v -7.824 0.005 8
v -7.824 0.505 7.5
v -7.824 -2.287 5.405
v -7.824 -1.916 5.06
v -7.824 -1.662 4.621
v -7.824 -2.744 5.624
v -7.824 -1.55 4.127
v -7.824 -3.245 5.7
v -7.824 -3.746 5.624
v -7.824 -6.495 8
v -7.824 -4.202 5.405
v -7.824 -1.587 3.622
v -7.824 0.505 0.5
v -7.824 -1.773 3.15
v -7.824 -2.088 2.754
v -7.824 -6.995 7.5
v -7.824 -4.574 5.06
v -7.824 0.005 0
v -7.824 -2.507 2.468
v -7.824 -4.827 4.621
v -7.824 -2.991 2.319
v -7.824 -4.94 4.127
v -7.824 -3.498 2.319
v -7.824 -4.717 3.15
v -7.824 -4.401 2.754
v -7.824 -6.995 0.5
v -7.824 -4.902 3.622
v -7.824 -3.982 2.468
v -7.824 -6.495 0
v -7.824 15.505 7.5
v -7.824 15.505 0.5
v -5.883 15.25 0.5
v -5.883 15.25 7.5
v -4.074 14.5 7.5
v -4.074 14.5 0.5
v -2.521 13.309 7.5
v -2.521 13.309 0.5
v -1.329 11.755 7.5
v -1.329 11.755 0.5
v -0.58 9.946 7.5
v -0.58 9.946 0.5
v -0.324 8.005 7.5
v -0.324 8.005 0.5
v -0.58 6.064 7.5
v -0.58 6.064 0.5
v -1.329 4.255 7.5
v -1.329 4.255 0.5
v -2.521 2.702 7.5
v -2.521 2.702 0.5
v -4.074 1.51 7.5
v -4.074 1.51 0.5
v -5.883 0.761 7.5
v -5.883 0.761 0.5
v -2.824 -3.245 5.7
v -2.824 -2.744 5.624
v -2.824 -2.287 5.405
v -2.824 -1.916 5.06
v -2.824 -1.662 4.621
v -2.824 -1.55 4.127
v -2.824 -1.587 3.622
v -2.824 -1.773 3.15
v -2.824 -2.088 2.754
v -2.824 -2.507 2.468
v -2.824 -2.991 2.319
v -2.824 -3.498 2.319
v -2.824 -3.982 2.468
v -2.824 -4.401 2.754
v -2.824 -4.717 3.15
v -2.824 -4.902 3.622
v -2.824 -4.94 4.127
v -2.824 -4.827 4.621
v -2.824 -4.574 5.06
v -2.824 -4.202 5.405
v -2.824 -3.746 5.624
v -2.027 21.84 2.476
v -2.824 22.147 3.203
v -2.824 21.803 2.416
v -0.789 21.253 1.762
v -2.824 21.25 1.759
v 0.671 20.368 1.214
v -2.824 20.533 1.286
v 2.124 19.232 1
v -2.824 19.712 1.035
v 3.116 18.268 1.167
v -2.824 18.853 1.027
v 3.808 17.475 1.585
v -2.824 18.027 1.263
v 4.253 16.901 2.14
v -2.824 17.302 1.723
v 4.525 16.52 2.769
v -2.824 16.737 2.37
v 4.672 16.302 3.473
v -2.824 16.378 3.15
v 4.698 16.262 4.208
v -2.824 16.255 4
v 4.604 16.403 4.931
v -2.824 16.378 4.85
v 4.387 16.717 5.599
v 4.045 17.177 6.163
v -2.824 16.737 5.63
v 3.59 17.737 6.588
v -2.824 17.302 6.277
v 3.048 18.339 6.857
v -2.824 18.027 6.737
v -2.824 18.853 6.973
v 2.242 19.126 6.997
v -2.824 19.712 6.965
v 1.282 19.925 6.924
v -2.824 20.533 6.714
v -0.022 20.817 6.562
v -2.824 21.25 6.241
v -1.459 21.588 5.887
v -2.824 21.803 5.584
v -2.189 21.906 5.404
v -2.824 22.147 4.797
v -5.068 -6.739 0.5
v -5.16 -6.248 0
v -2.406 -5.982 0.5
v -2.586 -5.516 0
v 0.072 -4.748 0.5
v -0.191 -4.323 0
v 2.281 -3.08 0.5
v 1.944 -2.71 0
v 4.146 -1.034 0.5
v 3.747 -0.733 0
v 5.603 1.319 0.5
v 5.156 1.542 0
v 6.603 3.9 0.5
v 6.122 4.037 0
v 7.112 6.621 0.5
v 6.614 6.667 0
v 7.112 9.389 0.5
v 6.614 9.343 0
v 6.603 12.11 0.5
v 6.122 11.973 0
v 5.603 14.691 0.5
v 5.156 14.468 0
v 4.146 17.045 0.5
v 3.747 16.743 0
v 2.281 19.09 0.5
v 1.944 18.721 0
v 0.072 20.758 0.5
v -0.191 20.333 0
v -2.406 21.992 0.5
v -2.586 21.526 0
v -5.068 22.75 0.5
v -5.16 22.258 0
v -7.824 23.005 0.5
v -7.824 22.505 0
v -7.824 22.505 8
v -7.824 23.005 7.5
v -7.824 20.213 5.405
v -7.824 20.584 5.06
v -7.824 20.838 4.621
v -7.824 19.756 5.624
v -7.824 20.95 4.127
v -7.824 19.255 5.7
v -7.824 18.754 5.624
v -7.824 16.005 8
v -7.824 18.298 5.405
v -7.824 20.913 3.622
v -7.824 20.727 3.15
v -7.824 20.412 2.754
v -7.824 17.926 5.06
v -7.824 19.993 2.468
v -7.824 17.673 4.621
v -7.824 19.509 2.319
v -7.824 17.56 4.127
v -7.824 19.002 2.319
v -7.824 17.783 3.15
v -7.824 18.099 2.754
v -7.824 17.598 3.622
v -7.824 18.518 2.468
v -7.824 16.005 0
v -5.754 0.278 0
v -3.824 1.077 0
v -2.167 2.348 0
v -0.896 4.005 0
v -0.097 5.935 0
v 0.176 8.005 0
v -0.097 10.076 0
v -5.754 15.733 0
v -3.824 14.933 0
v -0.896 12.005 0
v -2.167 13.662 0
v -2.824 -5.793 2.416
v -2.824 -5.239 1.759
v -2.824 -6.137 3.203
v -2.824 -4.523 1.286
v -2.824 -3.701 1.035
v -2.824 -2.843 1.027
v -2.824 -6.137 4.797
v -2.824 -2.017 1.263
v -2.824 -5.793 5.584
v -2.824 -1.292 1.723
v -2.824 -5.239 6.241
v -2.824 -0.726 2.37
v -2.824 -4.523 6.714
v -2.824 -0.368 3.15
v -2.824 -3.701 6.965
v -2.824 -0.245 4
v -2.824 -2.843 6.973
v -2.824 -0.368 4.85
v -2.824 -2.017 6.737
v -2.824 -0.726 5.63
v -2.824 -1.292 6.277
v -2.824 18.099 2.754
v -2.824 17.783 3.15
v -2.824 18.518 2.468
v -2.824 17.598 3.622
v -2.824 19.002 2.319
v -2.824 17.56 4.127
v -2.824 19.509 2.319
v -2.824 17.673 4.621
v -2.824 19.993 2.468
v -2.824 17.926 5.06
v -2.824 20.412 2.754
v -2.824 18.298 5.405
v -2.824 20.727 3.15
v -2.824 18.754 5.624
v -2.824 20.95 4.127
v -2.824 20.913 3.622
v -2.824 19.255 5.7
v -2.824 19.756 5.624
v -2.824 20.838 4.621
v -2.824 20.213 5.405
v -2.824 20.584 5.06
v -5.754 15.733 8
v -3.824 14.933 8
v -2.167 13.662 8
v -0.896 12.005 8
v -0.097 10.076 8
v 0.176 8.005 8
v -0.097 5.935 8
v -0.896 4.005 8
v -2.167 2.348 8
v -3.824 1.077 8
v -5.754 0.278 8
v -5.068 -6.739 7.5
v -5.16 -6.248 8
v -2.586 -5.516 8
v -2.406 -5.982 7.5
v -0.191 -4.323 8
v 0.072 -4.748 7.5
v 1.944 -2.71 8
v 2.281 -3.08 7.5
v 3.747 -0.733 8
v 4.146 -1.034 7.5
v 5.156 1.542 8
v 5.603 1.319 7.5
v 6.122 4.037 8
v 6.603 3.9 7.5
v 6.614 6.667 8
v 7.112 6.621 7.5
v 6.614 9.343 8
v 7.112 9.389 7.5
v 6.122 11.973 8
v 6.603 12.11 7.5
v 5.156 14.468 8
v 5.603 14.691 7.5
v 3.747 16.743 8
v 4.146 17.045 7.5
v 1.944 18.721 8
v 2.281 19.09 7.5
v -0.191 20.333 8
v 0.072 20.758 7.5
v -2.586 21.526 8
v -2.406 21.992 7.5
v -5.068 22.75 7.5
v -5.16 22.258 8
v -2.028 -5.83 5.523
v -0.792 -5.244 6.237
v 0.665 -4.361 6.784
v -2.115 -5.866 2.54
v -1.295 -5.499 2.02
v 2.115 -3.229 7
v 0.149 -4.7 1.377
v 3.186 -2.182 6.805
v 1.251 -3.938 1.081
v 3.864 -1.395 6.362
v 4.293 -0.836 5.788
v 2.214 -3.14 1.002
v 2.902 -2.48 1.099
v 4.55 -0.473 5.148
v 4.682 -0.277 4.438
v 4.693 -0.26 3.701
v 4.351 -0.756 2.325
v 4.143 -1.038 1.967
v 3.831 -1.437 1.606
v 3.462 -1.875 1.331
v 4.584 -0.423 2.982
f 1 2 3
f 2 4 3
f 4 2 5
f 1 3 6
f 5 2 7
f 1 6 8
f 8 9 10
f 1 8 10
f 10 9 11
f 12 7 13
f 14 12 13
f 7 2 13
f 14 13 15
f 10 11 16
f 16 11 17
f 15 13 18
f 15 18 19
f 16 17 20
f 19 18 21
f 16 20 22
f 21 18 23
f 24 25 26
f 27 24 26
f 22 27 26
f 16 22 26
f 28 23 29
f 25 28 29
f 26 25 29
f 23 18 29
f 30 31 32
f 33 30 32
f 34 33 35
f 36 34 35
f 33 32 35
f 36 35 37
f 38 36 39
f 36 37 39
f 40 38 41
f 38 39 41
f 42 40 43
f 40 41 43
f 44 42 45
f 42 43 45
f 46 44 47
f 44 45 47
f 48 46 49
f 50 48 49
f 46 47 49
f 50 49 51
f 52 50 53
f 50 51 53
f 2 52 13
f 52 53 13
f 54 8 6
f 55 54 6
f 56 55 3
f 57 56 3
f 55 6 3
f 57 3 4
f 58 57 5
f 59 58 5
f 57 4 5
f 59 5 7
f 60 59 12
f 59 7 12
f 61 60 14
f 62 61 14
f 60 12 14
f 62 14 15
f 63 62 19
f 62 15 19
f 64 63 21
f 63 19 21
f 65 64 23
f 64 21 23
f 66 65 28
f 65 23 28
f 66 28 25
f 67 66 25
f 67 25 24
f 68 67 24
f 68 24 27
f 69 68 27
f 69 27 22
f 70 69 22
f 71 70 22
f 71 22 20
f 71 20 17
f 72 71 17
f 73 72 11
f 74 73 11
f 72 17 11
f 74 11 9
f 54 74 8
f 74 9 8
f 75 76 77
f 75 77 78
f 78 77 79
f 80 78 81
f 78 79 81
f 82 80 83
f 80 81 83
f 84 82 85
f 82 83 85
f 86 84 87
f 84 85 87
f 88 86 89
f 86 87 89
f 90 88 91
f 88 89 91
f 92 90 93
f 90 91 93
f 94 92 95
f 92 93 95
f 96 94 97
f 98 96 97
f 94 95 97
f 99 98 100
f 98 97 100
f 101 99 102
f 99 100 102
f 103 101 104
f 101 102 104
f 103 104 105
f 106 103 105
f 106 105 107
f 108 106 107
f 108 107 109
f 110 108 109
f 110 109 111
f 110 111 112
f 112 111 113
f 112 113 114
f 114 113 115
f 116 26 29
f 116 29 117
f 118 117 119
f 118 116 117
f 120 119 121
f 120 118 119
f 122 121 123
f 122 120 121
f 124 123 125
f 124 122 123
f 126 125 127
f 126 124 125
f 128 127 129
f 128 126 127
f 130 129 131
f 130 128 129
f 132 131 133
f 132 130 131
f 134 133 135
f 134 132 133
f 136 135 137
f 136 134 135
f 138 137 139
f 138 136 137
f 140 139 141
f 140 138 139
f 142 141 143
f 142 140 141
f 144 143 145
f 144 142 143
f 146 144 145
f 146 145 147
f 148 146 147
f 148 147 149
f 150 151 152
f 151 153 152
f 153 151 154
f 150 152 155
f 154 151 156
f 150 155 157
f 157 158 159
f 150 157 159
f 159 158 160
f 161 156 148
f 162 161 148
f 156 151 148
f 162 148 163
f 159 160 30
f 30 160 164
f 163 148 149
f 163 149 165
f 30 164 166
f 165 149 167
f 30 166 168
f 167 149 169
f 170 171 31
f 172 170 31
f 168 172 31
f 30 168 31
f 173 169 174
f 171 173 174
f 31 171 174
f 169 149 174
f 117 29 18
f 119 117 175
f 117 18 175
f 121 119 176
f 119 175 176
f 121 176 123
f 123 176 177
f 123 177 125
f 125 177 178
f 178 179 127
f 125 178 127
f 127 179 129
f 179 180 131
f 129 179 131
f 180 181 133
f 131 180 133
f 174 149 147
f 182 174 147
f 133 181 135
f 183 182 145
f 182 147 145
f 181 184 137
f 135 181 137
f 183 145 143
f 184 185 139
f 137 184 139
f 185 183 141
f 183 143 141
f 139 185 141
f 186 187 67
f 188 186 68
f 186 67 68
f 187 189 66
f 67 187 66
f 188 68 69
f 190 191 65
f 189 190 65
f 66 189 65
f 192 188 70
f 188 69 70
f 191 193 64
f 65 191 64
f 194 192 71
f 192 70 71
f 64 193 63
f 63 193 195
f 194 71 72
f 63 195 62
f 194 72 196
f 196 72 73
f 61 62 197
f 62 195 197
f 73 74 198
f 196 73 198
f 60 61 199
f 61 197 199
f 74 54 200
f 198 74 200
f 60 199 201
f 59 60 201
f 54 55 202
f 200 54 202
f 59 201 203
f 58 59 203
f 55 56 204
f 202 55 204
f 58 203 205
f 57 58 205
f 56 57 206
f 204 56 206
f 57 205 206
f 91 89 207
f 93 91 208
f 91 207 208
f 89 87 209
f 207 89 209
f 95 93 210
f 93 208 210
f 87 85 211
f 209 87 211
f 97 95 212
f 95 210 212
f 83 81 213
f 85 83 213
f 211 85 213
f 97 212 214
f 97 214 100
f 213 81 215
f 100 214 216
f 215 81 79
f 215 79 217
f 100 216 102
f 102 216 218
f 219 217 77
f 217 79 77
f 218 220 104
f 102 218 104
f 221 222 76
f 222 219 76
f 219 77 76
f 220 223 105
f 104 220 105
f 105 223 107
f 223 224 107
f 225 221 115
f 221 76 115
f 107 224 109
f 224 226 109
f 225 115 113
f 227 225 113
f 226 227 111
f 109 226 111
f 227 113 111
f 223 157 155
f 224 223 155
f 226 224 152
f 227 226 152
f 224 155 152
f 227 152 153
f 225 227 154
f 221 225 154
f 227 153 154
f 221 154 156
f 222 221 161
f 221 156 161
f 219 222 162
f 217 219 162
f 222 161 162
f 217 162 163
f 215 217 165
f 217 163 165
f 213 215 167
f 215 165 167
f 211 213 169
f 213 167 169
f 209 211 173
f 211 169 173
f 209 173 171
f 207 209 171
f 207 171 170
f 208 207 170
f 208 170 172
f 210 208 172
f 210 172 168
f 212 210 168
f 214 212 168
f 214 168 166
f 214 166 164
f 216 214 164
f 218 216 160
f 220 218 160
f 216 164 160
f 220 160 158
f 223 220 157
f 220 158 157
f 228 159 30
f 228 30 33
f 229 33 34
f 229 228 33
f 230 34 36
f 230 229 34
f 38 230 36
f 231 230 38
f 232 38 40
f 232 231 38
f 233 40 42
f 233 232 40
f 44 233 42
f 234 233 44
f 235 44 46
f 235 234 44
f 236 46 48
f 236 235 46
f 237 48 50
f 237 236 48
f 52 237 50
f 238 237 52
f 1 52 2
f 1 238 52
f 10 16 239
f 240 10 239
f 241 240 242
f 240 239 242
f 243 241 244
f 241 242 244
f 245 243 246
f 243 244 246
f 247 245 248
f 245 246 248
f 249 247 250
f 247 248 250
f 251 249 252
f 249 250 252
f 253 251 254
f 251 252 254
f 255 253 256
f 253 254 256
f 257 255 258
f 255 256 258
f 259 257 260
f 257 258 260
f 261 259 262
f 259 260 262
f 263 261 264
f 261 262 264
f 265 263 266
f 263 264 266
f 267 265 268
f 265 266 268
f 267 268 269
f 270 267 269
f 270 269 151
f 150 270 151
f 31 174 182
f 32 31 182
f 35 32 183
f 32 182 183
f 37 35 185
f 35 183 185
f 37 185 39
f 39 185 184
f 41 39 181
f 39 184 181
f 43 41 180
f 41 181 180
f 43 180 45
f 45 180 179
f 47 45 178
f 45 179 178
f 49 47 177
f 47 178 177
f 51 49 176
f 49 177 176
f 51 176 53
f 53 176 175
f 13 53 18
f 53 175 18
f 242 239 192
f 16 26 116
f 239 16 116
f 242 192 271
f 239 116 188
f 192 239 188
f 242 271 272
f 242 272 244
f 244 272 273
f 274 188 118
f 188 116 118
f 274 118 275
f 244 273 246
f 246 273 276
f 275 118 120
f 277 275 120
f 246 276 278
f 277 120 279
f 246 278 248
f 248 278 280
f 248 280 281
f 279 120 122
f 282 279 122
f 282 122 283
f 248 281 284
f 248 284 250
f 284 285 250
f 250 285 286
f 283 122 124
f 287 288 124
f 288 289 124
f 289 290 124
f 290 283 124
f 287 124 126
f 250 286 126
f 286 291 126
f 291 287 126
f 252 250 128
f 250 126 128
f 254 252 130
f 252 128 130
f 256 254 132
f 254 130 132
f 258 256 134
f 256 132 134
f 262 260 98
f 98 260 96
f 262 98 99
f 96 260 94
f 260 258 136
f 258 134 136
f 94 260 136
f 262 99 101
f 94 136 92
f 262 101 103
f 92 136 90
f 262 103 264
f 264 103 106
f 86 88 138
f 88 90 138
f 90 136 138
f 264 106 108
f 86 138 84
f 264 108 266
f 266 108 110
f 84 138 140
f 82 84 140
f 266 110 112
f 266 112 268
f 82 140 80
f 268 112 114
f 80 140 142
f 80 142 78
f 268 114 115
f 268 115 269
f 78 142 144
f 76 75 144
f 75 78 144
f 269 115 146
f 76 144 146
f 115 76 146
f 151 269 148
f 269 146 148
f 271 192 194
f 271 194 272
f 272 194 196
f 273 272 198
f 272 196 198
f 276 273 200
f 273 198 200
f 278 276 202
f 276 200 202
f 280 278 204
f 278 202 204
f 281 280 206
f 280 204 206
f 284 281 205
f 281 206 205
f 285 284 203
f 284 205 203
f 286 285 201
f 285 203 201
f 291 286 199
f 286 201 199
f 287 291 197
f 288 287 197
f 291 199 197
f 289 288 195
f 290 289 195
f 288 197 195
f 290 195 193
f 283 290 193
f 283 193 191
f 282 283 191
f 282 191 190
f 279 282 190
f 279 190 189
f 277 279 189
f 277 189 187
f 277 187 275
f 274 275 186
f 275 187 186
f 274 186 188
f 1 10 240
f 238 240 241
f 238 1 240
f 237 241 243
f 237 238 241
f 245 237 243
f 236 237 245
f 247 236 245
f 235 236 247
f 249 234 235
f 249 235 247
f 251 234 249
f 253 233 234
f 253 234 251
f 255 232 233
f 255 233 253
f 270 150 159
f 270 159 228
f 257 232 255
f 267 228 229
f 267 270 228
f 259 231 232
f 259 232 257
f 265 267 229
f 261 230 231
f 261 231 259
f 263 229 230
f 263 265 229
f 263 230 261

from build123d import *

# Parameters (mm, degrees)
EXTRUDE_1_DEPTH     = 8
CUT_EXTRUDE_START   = -5
SKETCH_2_R          = 3
CUT_EXTRUDE_1_DEPTH = 10
SKETCH_2_3_R        = 1.7
CUT_EXTRUDE_2_DEPTH = 5
SKETCH_3_R          = 1.7
CUT_EXTRUDE_4_DEPTH = 5
SKETCH_3_3_R        = 3
CUT_EXTRUDE_3_DEPTH = 10
CHAMFER_1_SIZE      = 0.5


with BuildPart() as part:
    # 草图1 → 凸台-拉伸1 (new body)
    with BuildSketch(Plane.XY):
        with BuildLine():
            Line((-7.824326088, 23.005235362), (-7.824326088, 15.505235362))
            ThreePointArc((-7.824326088, 15.505235362), (-0.324326088, 8.005235362), (-7.824326088, 0.505235362))
            Line((-7.824326088, 0.505235362), (-7.824326088, -6.994764638))
            ThreePointArc((-7.824326088, -6.994764638), (7.175673912, 8.005235362), (-7.824326088, 23.005235362))
        make_face()
    extrude(amount=EXTRUDE_1_DEPTH)

    # 草图2 → 切除-拉伸1 (cut)
    with BuildSketch(Plane.ZY.offset(7.824326088).offset(CUT_EXTRUDE_START)):
        with Locations((4, 19.255235362)):
            Circle(SKETCH_2_R)
    extrude(amount=-CUT_EXTRUDE_1_DEPTH, mode=Mode.SUBTRACT)

    # 草图2<3> → 切除-拉伸2 (cut)
    with BuildSketch(Plane.ZY.offset(7.824326088)):
        with Locations((4, 19.255235362)):
            Circle(SKETCH_2_3_R)
    extrude(amount=-CUT_EXTRUDE_2_DEPTH, mode=Mode.SUBTRACT)

    # 草图3 → 切除-拉伸4 (cut)
    with BuildSketch(Plane.ZY.offset(7.824326088)):
        with Locations((4, -3.244764638)):
            Circle(SKETCH_3_R)
    extrude(amount=-CUT_EXTRUDE_4_DEPTH, mode=Mode.SUBTRACT)

    # 草图3<3> → 切除-拉伸3 (cut)
    with BuildSketch(Plane.ZY.offset(7.824326088).offset(CUT_EXTRUDE_START)):
        with Locations((4, -3.244764638)):
            Circle(SKETCH_3_3_R)
    extrude(amount=-CUT_EXTRUDE_3_DEPTH, mode=Mode.SUBTRACT)

    # 倒角1
    chamfer_1_edges = [part.edges().sort_by_distance(p)[0] for p in [
        (7.175673912, 8.005235362, 8),
        (-0.324326088, 8.005235362, 8),
        (7.175673912, 8.005235362, 0),
        (-0.324326088, 8.005235362, 0),
    ]]
    chamfer(chamfer_1_edges, length=CHAMFER_1_SIZE)


solid = part.part
